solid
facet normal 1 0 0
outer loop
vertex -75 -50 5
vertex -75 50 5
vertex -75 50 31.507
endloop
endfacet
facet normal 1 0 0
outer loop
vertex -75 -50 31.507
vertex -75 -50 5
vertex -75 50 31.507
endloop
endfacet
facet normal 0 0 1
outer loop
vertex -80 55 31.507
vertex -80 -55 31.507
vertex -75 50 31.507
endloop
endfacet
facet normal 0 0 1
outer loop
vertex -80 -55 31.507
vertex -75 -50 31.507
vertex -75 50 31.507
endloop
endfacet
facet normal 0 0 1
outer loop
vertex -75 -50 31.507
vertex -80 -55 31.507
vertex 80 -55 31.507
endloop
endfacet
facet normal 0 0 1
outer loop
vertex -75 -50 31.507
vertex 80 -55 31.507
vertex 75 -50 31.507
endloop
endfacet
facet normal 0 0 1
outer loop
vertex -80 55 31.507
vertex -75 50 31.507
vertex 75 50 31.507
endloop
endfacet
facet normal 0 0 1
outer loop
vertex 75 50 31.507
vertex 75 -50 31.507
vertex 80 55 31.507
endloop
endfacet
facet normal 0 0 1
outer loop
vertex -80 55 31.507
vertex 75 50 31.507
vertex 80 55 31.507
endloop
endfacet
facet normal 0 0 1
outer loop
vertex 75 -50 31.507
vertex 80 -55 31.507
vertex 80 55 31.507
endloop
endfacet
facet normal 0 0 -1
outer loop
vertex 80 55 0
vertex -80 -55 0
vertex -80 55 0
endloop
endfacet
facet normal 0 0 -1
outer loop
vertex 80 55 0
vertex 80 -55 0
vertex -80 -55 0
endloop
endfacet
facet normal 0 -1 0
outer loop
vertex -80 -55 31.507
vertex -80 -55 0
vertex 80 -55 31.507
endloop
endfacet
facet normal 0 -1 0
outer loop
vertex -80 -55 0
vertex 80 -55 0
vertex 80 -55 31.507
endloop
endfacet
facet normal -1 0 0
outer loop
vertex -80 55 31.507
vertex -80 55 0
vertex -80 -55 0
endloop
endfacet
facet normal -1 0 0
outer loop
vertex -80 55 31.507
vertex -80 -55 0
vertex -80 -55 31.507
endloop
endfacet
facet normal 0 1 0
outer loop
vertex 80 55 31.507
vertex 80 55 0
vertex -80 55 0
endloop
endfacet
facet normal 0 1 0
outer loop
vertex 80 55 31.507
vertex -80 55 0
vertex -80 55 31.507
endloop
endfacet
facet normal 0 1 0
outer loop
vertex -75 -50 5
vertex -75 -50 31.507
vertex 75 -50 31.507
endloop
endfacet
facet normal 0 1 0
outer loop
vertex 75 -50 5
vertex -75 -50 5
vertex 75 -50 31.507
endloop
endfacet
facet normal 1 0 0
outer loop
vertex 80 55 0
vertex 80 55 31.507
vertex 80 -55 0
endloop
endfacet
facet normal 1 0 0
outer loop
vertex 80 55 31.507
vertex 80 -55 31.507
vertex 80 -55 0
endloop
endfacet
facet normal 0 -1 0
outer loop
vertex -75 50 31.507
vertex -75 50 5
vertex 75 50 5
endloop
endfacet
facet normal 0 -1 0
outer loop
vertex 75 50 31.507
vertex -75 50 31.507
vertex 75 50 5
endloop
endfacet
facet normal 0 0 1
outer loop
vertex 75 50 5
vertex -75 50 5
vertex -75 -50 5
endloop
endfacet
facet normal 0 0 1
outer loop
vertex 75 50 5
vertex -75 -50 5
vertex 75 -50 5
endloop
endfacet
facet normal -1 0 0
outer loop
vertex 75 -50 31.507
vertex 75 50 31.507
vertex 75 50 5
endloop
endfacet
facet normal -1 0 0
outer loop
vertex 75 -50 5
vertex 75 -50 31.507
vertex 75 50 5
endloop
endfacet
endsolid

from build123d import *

# Parameters (mm, degrees)
SKETCH1_W           = 150
SKETCH1_H           = 100
BOSS_EXTRUDE1_DEPTH = 5
SKETCH2_W           = 150
SKETCH2_H           = 31.506784204
BOSS_EXTRUDE2_DEPTH = 5
SKETCH4_W           = 31.506784204
SKETCH4_H           = 105
BOSS_EXTRUDE3_DEPTH = 5
SKETCH5_W           = 155
SKETCH5_H           = 31.506784204
BOSS_EXTRUDE4_DEPTH = 5
SKETCH6_W           = 31.506784204
SKETCH6_H           = 110
BOSS_EXTRUDE5_DEPTH = 5


with BuildPart() as part:
    # Sketch1 → Boss-Extrude1 (new body)
    with BuildSketch(Plane.XY):
        Rectangle(SKETCH1_W, SKETCH1_H)
    extrude(amount=BOSS_EXTRUDE1_DEPTH)

    # Sketch2 → Boss-Extrude2 (add)
    with BuildSketch(Plane.XZ.offset(50)):
        with Locations((0, 15.753392102)):
            Rectangle(SKETCH2_W, SKETCH2_H)
    extrude(amount=BOSS_EXTRUDE2_DEPTH)

    # Sketch4 → Boss-Extrude3 (add)
    with BuildSketch(Plane(origin=(75, 0, 0), x_dir=(0, 0, -1), z_dir=(1, 0, 0))):
        with Locations((-15.753392102, -2.5)):
            Rectangle(SKETCH4_W, SKETCH4_H)
    extrude(amount=BOSS_EXTRUDE3_DEPTH)

    # Sketch5 → Boss-Extrude4 (add)
    with BuildSketch(Plane(origin=(0, 50, 0), x_dir=(1, 0, 0), z_dir=(0, 1, 0))):
        with Locations((2.5, -15.753392102)):
            Rectangle(SKETCH5_W, SKETCH5_H)
    extrude(amount=BOSS_EXTRUDE4_DEPTH)

    # Sketch6 → Boss-Extrude5 (add)
    with BuildSketch(Plane.ZY.offset(75)):
        with Locations((15.753392102, 0)):
            Rectangle(SKETCH6_W, SKETCH6_H)
    extrude(amount=BOSS_EXTRUDE5_DEPTH)


solid = part.part
